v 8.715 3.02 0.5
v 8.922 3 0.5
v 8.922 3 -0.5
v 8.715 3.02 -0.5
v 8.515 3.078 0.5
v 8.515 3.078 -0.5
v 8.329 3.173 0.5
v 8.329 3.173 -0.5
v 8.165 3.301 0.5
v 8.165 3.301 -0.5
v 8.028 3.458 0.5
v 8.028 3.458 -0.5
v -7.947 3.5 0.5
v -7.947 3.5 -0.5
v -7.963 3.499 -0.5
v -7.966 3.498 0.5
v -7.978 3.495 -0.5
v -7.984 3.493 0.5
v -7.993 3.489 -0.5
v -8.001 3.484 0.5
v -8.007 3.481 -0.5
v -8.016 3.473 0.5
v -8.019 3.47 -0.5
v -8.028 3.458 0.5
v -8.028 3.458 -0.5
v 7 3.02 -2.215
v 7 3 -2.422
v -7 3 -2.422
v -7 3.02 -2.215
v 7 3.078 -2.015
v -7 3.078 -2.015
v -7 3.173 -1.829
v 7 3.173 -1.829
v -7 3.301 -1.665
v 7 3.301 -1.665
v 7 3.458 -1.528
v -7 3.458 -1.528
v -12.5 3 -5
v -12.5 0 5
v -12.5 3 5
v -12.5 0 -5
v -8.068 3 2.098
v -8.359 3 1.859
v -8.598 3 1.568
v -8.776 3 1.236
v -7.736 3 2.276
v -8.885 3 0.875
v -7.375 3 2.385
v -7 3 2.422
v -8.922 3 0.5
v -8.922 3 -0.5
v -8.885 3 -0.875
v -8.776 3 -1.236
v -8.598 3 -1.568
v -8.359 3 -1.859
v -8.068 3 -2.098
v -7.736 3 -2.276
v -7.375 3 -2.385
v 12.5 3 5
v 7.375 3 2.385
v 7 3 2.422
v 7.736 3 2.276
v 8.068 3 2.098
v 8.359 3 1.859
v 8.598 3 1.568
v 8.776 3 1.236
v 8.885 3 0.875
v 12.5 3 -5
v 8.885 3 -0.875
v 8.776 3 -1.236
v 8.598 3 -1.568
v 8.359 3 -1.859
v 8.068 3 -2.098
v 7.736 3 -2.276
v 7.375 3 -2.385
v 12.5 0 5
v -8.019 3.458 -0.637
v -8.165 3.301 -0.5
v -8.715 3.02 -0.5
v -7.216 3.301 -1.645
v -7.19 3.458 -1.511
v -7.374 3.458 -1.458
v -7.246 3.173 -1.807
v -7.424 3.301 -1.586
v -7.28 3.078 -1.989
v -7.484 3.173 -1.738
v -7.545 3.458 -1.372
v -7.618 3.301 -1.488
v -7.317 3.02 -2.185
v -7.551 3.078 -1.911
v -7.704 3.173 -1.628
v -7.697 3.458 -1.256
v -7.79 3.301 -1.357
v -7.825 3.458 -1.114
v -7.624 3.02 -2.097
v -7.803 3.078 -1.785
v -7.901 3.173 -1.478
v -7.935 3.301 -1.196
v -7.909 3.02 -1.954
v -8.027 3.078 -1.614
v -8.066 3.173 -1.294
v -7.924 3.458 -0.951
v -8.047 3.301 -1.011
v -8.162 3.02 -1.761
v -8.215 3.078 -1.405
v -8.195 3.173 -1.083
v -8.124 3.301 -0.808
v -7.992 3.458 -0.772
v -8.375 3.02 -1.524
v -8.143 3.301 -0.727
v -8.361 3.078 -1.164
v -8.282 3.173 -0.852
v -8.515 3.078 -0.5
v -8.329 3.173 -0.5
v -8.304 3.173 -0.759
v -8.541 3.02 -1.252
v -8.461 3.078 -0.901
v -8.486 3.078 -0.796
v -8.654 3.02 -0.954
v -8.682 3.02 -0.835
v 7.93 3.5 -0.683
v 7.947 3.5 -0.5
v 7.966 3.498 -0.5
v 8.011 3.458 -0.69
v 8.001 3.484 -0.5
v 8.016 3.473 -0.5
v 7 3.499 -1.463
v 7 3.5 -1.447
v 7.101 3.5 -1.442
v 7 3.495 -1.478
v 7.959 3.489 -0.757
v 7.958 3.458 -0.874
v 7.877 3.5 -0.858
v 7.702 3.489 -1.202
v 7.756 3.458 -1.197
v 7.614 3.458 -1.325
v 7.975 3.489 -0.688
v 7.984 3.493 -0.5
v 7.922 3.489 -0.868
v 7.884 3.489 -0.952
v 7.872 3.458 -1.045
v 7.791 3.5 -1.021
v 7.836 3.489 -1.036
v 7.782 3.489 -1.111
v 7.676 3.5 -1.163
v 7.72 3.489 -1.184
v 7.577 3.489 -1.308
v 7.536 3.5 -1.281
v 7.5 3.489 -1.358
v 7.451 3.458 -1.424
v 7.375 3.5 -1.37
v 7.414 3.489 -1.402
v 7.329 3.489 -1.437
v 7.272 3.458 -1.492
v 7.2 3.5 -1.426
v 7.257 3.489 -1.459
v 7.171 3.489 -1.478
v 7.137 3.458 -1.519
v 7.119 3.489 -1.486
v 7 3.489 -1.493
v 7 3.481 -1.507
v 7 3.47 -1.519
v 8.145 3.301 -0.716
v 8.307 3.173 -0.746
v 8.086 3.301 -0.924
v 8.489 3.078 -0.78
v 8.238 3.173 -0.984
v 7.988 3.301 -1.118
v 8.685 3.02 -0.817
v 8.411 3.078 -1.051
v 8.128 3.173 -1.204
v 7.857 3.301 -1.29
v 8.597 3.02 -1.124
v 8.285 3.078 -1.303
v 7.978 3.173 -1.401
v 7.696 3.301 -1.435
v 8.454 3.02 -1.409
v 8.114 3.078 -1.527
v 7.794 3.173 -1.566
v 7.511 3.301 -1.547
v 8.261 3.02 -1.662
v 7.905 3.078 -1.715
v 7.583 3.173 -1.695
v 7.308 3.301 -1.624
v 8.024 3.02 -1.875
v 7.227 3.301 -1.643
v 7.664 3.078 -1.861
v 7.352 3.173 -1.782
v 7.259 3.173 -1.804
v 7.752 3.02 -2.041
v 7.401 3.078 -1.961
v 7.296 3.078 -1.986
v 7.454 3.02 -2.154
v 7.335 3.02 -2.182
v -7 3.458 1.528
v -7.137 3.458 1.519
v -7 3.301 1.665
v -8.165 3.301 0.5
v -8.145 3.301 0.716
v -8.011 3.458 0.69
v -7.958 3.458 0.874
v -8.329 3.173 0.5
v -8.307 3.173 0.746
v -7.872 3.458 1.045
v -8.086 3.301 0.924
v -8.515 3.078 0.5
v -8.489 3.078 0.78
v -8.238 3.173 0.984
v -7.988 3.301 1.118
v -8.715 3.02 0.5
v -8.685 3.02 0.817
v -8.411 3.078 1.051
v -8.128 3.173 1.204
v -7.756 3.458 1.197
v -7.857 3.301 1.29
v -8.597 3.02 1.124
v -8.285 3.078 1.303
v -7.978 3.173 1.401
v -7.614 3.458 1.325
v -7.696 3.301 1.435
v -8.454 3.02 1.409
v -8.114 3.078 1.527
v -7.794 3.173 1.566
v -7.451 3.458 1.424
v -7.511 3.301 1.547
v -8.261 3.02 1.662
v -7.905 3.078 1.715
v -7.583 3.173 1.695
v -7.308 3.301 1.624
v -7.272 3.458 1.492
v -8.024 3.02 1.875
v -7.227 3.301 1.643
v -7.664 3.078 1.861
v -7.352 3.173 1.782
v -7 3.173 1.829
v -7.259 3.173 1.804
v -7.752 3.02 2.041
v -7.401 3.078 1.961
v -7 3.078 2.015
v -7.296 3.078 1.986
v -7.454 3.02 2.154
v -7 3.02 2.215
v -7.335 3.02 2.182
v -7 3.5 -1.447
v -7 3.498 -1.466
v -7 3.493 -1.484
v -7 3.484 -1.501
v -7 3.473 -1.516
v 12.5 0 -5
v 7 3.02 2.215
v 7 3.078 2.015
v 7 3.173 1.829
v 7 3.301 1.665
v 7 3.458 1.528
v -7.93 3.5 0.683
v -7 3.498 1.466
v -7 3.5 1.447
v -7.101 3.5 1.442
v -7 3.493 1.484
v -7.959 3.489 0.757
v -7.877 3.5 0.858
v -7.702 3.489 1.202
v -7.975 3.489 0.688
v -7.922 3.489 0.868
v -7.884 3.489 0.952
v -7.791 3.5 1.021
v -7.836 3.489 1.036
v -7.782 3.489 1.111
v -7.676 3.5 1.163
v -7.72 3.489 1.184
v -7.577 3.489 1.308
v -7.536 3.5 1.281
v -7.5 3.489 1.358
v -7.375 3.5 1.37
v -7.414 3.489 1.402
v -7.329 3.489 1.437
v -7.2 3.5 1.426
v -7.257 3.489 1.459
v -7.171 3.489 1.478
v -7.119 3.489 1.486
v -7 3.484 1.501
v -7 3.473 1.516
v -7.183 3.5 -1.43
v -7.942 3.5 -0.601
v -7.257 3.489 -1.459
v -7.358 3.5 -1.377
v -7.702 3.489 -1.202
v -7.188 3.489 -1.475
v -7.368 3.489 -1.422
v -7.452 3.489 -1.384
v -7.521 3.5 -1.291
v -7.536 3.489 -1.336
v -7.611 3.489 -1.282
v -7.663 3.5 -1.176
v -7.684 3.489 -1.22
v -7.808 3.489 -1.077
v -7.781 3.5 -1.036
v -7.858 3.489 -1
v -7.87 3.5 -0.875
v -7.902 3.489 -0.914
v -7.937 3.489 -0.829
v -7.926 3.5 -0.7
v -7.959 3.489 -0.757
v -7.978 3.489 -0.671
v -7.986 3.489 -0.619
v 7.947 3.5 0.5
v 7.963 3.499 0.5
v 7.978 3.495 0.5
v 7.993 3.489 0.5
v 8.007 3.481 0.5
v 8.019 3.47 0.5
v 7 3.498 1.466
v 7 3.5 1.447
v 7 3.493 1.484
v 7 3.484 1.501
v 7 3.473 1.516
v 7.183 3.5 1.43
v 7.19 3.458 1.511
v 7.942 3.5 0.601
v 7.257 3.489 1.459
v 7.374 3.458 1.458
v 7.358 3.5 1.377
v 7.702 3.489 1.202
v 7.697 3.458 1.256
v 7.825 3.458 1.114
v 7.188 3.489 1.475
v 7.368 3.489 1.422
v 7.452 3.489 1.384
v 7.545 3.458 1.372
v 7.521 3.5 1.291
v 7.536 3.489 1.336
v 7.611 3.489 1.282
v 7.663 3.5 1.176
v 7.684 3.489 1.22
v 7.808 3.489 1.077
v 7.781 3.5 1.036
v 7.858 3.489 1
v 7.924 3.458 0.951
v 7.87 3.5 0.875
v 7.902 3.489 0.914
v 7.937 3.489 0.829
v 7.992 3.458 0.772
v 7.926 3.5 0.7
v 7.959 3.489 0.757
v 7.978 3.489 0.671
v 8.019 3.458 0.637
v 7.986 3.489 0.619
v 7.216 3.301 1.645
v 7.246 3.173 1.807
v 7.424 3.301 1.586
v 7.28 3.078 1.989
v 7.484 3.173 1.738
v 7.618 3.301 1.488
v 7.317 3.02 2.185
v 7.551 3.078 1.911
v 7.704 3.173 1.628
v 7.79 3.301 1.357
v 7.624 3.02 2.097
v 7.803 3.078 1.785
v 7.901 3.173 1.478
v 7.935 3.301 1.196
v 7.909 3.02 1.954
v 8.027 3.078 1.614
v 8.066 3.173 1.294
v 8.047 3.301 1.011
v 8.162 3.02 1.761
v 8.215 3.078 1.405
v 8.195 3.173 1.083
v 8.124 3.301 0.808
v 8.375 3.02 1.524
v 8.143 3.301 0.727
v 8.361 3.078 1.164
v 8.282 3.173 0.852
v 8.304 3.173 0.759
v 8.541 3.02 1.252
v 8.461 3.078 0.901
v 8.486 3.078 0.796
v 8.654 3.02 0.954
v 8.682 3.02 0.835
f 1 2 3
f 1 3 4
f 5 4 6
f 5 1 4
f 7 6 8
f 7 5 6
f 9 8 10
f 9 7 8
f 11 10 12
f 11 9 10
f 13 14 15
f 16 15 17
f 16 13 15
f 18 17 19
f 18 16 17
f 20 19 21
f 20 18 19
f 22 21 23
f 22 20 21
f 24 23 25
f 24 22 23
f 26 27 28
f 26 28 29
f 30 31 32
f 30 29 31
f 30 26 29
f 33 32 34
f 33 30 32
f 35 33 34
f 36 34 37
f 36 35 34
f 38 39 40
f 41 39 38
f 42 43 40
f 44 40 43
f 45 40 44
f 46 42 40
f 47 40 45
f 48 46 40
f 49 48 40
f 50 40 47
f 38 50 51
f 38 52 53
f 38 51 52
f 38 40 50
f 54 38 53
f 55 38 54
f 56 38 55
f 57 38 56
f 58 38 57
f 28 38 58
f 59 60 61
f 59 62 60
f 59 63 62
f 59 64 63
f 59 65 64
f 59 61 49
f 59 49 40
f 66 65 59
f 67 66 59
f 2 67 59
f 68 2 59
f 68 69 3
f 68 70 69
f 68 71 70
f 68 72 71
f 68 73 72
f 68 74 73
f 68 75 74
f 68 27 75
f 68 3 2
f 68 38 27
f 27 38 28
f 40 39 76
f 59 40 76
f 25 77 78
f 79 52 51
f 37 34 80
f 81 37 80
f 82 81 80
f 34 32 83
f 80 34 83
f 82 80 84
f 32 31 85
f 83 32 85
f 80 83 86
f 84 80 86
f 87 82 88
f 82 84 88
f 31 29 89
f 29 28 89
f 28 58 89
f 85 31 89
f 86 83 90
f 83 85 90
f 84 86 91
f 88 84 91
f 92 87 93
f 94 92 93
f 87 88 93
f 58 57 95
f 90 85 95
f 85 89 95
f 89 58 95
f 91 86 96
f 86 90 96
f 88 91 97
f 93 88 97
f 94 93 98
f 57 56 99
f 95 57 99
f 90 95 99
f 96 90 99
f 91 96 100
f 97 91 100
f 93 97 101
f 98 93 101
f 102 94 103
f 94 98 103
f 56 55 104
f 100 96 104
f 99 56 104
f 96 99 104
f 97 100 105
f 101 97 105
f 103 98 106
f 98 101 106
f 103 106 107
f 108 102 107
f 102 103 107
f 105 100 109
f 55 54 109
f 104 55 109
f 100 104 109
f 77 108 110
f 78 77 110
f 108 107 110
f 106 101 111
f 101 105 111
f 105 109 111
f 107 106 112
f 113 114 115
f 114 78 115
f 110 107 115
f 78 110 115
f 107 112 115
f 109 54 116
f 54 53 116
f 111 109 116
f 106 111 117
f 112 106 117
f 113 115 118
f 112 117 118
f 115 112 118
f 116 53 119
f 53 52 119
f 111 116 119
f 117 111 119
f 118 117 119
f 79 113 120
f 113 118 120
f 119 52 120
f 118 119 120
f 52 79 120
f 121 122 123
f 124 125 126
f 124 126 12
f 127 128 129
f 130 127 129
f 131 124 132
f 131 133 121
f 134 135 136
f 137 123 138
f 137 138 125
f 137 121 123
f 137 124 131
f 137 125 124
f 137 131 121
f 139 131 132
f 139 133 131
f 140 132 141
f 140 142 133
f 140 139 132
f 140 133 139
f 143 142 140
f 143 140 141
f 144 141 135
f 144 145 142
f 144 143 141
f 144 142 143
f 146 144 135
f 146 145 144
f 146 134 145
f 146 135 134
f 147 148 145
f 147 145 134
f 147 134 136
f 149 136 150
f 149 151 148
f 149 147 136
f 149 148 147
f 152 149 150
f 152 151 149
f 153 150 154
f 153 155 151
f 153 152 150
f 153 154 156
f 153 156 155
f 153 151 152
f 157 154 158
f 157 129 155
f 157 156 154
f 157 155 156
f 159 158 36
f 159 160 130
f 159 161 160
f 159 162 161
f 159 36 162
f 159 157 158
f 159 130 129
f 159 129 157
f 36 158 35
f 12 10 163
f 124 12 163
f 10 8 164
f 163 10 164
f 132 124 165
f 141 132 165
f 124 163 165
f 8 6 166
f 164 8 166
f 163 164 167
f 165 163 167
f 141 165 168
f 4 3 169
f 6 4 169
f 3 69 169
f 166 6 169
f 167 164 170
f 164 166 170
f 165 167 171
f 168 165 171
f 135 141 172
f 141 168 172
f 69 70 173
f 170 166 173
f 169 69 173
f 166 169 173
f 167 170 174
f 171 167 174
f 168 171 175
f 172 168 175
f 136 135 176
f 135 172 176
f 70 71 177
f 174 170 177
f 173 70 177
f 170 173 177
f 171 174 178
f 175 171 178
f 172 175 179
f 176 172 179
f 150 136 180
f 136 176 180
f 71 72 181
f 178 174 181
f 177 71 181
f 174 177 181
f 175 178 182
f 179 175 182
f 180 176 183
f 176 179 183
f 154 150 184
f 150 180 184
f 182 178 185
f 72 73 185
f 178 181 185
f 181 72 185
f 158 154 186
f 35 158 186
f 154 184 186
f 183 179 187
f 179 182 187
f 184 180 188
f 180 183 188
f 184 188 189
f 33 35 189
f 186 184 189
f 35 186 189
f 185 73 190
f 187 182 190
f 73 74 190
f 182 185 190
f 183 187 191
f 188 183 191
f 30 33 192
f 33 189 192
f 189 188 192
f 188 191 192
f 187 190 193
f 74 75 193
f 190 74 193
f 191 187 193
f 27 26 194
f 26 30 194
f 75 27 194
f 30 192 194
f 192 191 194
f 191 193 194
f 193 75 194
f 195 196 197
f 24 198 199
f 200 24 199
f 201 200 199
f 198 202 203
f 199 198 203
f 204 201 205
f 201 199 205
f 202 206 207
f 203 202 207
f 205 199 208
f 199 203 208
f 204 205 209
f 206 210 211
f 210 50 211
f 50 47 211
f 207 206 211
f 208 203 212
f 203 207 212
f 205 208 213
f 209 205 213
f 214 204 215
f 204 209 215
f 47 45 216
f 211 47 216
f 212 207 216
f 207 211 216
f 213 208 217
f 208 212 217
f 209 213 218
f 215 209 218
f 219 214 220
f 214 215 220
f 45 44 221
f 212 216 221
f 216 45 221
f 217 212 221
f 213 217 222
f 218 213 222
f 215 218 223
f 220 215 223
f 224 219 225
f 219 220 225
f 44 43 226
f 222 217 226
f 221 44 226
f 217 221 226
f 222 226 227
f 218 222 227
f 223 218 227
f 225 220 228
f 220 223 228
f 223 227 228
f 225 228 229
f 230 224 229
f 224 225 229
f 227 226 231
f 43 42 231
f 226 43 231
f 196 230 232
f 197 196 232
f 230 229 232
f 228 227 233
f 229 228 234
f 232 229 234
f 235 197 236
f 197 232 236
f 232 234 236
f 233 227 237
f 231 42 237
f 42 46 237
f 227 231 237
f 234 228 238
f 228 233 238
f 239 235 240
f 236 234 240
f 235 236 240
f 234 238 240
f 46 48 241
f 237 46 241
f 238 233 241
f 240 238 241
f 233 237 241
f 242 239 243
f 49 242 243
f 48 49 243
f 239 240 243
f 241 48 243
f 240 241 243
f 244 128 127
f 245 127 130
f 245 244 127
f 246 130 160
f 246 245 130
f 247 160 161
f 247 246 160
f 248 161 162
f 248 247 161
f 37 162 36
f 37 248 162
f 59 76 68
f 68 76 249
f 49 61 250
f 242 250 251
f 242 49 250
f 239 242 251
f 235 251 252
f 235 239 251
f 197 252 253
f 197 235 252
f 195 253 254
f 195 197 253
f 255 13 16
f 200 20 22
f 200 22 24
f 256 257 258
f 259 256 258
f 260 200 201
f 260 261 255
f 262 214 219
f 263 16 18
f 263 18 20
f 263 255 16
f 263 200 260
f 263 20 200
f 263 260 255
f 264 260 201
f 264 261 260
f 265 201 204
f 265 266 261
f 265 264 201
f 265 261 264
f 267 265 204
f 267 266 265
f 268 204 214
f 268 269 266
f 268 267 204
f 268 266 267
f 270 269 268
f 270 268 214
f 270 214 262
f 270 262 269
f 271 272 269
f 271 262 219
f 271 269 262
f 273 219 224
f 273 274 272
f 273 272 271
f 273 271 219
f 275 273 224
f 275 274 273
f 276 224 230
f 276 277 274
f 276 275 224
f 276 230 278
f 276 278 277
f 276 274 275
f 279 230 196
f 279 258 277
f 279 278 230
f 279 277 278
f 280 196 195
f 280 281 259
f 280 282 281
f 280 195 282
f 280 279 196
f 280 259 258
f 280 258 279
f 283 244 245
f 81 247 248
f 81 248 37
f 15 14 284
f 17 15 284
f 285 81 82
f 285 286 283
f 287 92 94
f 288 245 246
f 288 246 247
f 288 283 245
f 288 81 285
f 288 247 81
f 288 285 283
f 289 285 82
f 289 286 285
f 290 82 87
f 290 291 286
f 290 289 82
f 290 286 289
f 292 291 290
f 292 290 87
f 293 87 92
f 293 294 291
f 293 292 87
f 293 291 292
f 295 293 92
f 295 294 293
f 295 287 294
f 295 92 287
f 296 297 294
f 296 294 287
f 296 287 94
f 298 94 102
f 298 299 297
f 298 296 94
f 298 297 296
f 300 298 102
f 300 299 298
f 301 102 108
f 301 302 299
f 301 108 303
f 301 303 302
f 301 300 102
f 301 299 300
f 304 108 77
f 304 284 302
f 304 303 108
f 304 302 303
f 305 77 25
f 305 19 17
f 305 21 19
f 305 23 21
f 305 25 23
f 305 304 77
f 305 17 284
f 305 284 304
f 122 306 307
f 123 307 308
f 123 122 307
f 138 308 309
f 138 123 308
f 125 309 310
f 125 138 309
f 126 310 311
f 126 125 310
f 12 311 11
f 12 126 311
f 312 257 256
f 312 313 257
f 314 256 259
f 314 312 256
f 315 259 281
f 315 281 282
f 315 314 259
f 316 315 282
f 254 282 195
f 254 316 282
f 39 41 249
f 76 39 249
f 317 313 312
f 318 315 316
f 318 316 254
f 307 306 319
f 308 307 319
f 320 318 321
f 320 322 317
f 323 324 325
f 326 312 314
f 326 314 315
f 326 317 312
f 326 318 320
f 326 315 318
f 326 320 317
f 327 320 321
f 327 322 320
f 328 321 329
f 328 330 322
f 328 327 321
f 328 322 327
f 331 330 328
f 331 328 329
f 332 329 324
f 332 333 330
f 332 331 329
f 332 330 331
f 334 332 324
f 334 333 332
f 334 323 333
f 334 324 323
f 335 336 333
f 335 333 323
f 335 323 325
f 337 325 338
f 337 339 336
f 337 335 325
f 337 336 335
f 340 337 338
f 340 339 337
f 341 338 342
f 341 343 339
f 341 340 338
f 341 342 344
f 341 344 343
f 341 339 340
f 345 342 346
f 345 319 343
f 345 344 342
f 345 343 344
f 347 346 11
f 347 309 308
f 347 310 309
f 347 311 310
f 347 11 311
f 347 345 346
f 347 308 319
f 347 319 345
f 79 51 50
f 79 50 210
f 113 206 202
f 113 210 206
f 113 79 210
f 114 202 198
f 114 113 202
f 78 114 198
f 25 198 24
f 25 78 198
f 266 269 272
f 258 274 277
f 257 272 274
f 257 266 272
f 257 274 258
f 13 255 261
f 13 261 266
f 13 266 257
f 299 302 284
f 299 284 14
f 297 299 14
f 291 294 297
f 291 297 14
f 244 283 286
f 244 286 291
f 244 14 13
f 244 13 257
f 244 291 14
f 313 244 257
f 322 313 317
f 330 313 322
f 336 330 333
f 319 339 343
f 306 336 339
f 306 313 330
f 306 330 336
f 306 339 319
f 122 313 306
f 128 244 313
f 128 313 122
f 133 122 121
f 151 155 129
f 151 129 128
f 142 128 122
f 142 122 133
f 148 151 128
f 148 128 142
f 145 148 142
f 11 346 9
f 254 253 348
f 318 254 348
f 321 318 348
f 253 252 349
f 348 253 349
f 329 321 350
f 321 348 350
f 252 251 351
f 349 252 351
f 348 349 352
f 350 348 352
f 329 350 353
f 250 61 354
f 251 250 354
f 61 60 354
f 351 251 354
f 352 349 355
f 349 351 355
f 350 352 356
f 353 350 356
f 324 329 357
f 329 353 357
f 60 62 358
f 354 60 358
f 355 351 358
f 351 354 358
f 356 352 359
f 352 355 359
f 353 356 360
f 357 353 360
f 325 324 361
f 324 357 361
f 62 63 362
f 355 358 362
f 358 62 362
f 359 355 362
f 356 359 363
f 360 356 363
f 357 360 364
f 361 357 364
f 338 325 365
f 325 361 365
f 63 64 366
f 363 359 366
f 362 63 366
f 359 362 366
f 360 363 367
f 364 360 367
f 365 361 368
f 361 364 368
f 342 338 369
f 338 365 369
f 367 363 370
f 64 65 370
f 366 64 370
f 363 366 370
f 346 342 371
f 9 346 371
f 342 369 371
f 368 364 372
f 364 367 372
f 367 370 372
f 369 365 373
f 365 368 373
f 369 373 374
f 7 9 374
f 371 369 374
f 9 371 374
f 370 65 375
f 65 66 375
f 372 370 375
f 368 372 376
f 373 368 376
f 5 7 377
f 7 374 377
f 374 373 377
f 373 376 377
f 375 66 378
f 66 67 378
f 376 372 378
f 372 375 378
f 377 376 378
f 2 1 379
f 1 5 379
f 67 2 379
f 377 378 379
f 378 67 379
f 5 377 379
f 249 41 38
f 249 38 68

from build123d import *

# Parameters (mm, degrees)
SKETCH_1_W      = 25
SKETCH_1_H      = 10
EXTRUDE_1_DEPTH = 3
EXTRUDE_2_DEPTH = 0.5
FILLET_1_R      = 1.1
FILLET_2_R      = 0.1


with BuildPart() as part:
    # 草图1 → 凸台-拉伸1 (new body)
    with BuildSketch(Plane(origin=(0, 0, 0), x_dir=(1, 0, 0), z_dir=(0, 1, 0))):
        Rectangle(SKETCH_1_W, SKETCH_1_H)
    extrude(amount=EXTRUDE_1_DEPTH)

    # 草图2 → 凸台-拉伸2 (add)
    with BuildSketch(Plane(origin=(0, 3, 0), x_dir=(1, 0, 0), z_dir=(0, 1, 0))):
        with BuildLine():
            Line((7, 1.5), (-7, 1.5))
            ThreePointArc((-7, 1.5), (-7.707106781, 1.207106781), (-8, 0.5))
            Line((-8, 0.5), (-8, -0.5))
            ThreePointArc((-8, -0.5), (-7.707106781, -1.207106781), (-7, -1.5))
            Line((-7, -1.5), (7, -1.5))
            ThreePointArc((7, -1.5), (7.707106781, -1.207106781), (8, -0.5))
            Line((8, -0.5), (8, 0.5))
            ThreePointArc((8, 0.5), (7.707106781, 1.207106781), (7, 1.5))
        make_face()
    extrude(amount=EXTRUDE_2_DEPTH)

    # 圆角1
    # the kernel refuses this fillet: 1.1 mm, written as the material it adds along each edge
    with BuildSketch(Plane(origin=(-7, 3, 0.5), x_dir=(-1, 0, 0), z_dir=(0, 0, -1))) as fillet_1_piece_1:
        with BuildLine():
            CenterArc((1.921954446, 1.1), FILLET_1_R, 213.055731151, 56.944268849)
            Line((1, 0.5), (0.981560911, 0.488))
            ThreePointArc((0.981560911, 0.488), (0.978, 0.25), (0.978, 0))
            Line((0.978, 0), (1, -0.022))
            Line((1, -0.022), (1.921954446, -0.022))
            Line((1.921954446, -0.022), (1.921954446, 0))
        make_face()
    revolve(axis=Axis((-7, 3, 0.5), (0, 1, 0)), revolution_arc=90)
    with BuildSketch(Plane(origin=(-8, 3, -0.5), x_dir=(-1, 0, 0), z_dir=(0, 0, 1)), Plane(origin=(8, 3, 0.5), x_dir=(1, 0, 0), z_dir=(0, 0, -1))) as fillet_1_piece_2:
        with BuildLine():
            CenterArc((0.921954446, -1.1), FILLET_1_R, 90, 56.944268849)
            Line((0, -0.5), (-0.018439089, -0.488))
            ThreePointArc((-0.018439089, -0.488), (-0.022, -0.25), (-0.022, 0))
            Line((-0.022, 0), (0, 0.022))
            Line((0, 0.022), (0.921954446, 0.022))
            Line((0.921954446, 0.022), (0.921954446, 0))
        make_face()
    extrude(amount=1)
    with BuildSketch(Plane(origin=(-7, 3, -0.5), x_dir=(0, 0, -1), z_dir=(1, 0, 0))) as fillet_1_piece_3:
        with BuildLine():
            CenterArc((1.921954446, 1.1), FILLET_1_R, 213.055731151, 56.944268849)
            Line((1, 0.5), (0.981560911, 0.488))
            ThreePointArc((0.981560911, 0.488), (0.978, 0.25), (0.978, 0))
            Line((0.978, 0), (1, -0.022))
            Line((1, -0.022), (1.921954446, -0.022))
            Line((1.921954446, -0.022), (1.921954446, 0))
        make_face()
    revolve(axis=Axis((-7, 3, -0.5), (0, 1, 0)), revolution_arc=90)
    with BuildSketch(Plane(origin=(7, 3, -1.5), x_dir=(0, 0, -1), z_dir=(-1, 0, 0)), Plane(origin=(-7, 3, 1.5), x_dir=(0, 0, 1), z_dir=(1, 0, 0))) as fillet_1_piece_4:
        with BuildLine():
            CenterArc((0.921954446, -1.1), FILLET_1_R, 90, 56.944268849)
            Line((0, -0.5), (-0.018439089, -0.488))
            ThreePointArc((-0.018439089, -0.488), (-0.022, -0.25), (-0.022, 0))
            Line((-0.022, 0), (0, 0.022))
            Line((0, 0.022), (0.921954446, 0.022))
            Line((0.921954446, 0.022), (0.921954446, 0))
        make_face()
    extrude(amount=14)
    with BuildSketch(Plane(origin=(7, 3, -0.5), x_dir=(1, 0, 0), z_dir=(0, 0, 1))) as fillet_1_piece_5:
        with BuildLine():
            CenterArc((1.921954446, 1.1), FILLET_1_R, 213.055731151, 56.944268849)
            Line((1, 0.5), (0.981560911, 0.488))
            ThreePointArc((0.981560911, 0.488), (0.978, 0.25), (0.978, 0))
            Line((0.978, 0), (1, -0.022))
            Line((1, -0.022), (1.921954446, -0.022))
            Line((1.921954446, -0.022), (1.921954446, 0))
        make_face()
    revolve(axis=Axis((7, 3, -0.5), (0, 1, 0)), revolution_arc=90)
    with BuildSketch(Plane(origin=(7, 3, 0.5), x_dir=(0, 0, 1), z_dir=(-1, 0, 0))) as fillet_1_piece_6:
        with BuildLine():
            CenterArc((1.921954446, 1.1), FILLET_1_R, 213.055731151, 56.944268849)
            Line((1, 0.5), (0.981560911, 0.488))
            ThreePointArc((0.981560911, 0.488), (0.978, 0.25), (0.978, 0))
            Line((0.978, 0), (1, -0.022))
            Line((1, -0.022), (1.921954446, -0.022))
            Line((1.921954446, -0.022), (1.921954446, 0))
        make_face()
    revolve(axis=Axis((7, 3, 0.5), (0, 1, 0)), revolution_arc=90)

    # 圆角2
    fillet_2_edges = [part.edges().sort_by_distance(p)[0] for p in [
        (-7.707106781, 3.5, 1.207106781),
        (0, 3.5, 1.5),
        (7.707106781, 3.5, 1.207106781),
        (8, 3.5, 0),
        (7.707106781, 3.5, -1.207106781),
        (0, 3.5, -1.5),
        (-7.707106781, 3.5, -1.207106781),
        (-8, 3.5, 0),
    ]]
    fillet(fillet_2_edges, radius=FILLET_2_R)


solid = part.part
